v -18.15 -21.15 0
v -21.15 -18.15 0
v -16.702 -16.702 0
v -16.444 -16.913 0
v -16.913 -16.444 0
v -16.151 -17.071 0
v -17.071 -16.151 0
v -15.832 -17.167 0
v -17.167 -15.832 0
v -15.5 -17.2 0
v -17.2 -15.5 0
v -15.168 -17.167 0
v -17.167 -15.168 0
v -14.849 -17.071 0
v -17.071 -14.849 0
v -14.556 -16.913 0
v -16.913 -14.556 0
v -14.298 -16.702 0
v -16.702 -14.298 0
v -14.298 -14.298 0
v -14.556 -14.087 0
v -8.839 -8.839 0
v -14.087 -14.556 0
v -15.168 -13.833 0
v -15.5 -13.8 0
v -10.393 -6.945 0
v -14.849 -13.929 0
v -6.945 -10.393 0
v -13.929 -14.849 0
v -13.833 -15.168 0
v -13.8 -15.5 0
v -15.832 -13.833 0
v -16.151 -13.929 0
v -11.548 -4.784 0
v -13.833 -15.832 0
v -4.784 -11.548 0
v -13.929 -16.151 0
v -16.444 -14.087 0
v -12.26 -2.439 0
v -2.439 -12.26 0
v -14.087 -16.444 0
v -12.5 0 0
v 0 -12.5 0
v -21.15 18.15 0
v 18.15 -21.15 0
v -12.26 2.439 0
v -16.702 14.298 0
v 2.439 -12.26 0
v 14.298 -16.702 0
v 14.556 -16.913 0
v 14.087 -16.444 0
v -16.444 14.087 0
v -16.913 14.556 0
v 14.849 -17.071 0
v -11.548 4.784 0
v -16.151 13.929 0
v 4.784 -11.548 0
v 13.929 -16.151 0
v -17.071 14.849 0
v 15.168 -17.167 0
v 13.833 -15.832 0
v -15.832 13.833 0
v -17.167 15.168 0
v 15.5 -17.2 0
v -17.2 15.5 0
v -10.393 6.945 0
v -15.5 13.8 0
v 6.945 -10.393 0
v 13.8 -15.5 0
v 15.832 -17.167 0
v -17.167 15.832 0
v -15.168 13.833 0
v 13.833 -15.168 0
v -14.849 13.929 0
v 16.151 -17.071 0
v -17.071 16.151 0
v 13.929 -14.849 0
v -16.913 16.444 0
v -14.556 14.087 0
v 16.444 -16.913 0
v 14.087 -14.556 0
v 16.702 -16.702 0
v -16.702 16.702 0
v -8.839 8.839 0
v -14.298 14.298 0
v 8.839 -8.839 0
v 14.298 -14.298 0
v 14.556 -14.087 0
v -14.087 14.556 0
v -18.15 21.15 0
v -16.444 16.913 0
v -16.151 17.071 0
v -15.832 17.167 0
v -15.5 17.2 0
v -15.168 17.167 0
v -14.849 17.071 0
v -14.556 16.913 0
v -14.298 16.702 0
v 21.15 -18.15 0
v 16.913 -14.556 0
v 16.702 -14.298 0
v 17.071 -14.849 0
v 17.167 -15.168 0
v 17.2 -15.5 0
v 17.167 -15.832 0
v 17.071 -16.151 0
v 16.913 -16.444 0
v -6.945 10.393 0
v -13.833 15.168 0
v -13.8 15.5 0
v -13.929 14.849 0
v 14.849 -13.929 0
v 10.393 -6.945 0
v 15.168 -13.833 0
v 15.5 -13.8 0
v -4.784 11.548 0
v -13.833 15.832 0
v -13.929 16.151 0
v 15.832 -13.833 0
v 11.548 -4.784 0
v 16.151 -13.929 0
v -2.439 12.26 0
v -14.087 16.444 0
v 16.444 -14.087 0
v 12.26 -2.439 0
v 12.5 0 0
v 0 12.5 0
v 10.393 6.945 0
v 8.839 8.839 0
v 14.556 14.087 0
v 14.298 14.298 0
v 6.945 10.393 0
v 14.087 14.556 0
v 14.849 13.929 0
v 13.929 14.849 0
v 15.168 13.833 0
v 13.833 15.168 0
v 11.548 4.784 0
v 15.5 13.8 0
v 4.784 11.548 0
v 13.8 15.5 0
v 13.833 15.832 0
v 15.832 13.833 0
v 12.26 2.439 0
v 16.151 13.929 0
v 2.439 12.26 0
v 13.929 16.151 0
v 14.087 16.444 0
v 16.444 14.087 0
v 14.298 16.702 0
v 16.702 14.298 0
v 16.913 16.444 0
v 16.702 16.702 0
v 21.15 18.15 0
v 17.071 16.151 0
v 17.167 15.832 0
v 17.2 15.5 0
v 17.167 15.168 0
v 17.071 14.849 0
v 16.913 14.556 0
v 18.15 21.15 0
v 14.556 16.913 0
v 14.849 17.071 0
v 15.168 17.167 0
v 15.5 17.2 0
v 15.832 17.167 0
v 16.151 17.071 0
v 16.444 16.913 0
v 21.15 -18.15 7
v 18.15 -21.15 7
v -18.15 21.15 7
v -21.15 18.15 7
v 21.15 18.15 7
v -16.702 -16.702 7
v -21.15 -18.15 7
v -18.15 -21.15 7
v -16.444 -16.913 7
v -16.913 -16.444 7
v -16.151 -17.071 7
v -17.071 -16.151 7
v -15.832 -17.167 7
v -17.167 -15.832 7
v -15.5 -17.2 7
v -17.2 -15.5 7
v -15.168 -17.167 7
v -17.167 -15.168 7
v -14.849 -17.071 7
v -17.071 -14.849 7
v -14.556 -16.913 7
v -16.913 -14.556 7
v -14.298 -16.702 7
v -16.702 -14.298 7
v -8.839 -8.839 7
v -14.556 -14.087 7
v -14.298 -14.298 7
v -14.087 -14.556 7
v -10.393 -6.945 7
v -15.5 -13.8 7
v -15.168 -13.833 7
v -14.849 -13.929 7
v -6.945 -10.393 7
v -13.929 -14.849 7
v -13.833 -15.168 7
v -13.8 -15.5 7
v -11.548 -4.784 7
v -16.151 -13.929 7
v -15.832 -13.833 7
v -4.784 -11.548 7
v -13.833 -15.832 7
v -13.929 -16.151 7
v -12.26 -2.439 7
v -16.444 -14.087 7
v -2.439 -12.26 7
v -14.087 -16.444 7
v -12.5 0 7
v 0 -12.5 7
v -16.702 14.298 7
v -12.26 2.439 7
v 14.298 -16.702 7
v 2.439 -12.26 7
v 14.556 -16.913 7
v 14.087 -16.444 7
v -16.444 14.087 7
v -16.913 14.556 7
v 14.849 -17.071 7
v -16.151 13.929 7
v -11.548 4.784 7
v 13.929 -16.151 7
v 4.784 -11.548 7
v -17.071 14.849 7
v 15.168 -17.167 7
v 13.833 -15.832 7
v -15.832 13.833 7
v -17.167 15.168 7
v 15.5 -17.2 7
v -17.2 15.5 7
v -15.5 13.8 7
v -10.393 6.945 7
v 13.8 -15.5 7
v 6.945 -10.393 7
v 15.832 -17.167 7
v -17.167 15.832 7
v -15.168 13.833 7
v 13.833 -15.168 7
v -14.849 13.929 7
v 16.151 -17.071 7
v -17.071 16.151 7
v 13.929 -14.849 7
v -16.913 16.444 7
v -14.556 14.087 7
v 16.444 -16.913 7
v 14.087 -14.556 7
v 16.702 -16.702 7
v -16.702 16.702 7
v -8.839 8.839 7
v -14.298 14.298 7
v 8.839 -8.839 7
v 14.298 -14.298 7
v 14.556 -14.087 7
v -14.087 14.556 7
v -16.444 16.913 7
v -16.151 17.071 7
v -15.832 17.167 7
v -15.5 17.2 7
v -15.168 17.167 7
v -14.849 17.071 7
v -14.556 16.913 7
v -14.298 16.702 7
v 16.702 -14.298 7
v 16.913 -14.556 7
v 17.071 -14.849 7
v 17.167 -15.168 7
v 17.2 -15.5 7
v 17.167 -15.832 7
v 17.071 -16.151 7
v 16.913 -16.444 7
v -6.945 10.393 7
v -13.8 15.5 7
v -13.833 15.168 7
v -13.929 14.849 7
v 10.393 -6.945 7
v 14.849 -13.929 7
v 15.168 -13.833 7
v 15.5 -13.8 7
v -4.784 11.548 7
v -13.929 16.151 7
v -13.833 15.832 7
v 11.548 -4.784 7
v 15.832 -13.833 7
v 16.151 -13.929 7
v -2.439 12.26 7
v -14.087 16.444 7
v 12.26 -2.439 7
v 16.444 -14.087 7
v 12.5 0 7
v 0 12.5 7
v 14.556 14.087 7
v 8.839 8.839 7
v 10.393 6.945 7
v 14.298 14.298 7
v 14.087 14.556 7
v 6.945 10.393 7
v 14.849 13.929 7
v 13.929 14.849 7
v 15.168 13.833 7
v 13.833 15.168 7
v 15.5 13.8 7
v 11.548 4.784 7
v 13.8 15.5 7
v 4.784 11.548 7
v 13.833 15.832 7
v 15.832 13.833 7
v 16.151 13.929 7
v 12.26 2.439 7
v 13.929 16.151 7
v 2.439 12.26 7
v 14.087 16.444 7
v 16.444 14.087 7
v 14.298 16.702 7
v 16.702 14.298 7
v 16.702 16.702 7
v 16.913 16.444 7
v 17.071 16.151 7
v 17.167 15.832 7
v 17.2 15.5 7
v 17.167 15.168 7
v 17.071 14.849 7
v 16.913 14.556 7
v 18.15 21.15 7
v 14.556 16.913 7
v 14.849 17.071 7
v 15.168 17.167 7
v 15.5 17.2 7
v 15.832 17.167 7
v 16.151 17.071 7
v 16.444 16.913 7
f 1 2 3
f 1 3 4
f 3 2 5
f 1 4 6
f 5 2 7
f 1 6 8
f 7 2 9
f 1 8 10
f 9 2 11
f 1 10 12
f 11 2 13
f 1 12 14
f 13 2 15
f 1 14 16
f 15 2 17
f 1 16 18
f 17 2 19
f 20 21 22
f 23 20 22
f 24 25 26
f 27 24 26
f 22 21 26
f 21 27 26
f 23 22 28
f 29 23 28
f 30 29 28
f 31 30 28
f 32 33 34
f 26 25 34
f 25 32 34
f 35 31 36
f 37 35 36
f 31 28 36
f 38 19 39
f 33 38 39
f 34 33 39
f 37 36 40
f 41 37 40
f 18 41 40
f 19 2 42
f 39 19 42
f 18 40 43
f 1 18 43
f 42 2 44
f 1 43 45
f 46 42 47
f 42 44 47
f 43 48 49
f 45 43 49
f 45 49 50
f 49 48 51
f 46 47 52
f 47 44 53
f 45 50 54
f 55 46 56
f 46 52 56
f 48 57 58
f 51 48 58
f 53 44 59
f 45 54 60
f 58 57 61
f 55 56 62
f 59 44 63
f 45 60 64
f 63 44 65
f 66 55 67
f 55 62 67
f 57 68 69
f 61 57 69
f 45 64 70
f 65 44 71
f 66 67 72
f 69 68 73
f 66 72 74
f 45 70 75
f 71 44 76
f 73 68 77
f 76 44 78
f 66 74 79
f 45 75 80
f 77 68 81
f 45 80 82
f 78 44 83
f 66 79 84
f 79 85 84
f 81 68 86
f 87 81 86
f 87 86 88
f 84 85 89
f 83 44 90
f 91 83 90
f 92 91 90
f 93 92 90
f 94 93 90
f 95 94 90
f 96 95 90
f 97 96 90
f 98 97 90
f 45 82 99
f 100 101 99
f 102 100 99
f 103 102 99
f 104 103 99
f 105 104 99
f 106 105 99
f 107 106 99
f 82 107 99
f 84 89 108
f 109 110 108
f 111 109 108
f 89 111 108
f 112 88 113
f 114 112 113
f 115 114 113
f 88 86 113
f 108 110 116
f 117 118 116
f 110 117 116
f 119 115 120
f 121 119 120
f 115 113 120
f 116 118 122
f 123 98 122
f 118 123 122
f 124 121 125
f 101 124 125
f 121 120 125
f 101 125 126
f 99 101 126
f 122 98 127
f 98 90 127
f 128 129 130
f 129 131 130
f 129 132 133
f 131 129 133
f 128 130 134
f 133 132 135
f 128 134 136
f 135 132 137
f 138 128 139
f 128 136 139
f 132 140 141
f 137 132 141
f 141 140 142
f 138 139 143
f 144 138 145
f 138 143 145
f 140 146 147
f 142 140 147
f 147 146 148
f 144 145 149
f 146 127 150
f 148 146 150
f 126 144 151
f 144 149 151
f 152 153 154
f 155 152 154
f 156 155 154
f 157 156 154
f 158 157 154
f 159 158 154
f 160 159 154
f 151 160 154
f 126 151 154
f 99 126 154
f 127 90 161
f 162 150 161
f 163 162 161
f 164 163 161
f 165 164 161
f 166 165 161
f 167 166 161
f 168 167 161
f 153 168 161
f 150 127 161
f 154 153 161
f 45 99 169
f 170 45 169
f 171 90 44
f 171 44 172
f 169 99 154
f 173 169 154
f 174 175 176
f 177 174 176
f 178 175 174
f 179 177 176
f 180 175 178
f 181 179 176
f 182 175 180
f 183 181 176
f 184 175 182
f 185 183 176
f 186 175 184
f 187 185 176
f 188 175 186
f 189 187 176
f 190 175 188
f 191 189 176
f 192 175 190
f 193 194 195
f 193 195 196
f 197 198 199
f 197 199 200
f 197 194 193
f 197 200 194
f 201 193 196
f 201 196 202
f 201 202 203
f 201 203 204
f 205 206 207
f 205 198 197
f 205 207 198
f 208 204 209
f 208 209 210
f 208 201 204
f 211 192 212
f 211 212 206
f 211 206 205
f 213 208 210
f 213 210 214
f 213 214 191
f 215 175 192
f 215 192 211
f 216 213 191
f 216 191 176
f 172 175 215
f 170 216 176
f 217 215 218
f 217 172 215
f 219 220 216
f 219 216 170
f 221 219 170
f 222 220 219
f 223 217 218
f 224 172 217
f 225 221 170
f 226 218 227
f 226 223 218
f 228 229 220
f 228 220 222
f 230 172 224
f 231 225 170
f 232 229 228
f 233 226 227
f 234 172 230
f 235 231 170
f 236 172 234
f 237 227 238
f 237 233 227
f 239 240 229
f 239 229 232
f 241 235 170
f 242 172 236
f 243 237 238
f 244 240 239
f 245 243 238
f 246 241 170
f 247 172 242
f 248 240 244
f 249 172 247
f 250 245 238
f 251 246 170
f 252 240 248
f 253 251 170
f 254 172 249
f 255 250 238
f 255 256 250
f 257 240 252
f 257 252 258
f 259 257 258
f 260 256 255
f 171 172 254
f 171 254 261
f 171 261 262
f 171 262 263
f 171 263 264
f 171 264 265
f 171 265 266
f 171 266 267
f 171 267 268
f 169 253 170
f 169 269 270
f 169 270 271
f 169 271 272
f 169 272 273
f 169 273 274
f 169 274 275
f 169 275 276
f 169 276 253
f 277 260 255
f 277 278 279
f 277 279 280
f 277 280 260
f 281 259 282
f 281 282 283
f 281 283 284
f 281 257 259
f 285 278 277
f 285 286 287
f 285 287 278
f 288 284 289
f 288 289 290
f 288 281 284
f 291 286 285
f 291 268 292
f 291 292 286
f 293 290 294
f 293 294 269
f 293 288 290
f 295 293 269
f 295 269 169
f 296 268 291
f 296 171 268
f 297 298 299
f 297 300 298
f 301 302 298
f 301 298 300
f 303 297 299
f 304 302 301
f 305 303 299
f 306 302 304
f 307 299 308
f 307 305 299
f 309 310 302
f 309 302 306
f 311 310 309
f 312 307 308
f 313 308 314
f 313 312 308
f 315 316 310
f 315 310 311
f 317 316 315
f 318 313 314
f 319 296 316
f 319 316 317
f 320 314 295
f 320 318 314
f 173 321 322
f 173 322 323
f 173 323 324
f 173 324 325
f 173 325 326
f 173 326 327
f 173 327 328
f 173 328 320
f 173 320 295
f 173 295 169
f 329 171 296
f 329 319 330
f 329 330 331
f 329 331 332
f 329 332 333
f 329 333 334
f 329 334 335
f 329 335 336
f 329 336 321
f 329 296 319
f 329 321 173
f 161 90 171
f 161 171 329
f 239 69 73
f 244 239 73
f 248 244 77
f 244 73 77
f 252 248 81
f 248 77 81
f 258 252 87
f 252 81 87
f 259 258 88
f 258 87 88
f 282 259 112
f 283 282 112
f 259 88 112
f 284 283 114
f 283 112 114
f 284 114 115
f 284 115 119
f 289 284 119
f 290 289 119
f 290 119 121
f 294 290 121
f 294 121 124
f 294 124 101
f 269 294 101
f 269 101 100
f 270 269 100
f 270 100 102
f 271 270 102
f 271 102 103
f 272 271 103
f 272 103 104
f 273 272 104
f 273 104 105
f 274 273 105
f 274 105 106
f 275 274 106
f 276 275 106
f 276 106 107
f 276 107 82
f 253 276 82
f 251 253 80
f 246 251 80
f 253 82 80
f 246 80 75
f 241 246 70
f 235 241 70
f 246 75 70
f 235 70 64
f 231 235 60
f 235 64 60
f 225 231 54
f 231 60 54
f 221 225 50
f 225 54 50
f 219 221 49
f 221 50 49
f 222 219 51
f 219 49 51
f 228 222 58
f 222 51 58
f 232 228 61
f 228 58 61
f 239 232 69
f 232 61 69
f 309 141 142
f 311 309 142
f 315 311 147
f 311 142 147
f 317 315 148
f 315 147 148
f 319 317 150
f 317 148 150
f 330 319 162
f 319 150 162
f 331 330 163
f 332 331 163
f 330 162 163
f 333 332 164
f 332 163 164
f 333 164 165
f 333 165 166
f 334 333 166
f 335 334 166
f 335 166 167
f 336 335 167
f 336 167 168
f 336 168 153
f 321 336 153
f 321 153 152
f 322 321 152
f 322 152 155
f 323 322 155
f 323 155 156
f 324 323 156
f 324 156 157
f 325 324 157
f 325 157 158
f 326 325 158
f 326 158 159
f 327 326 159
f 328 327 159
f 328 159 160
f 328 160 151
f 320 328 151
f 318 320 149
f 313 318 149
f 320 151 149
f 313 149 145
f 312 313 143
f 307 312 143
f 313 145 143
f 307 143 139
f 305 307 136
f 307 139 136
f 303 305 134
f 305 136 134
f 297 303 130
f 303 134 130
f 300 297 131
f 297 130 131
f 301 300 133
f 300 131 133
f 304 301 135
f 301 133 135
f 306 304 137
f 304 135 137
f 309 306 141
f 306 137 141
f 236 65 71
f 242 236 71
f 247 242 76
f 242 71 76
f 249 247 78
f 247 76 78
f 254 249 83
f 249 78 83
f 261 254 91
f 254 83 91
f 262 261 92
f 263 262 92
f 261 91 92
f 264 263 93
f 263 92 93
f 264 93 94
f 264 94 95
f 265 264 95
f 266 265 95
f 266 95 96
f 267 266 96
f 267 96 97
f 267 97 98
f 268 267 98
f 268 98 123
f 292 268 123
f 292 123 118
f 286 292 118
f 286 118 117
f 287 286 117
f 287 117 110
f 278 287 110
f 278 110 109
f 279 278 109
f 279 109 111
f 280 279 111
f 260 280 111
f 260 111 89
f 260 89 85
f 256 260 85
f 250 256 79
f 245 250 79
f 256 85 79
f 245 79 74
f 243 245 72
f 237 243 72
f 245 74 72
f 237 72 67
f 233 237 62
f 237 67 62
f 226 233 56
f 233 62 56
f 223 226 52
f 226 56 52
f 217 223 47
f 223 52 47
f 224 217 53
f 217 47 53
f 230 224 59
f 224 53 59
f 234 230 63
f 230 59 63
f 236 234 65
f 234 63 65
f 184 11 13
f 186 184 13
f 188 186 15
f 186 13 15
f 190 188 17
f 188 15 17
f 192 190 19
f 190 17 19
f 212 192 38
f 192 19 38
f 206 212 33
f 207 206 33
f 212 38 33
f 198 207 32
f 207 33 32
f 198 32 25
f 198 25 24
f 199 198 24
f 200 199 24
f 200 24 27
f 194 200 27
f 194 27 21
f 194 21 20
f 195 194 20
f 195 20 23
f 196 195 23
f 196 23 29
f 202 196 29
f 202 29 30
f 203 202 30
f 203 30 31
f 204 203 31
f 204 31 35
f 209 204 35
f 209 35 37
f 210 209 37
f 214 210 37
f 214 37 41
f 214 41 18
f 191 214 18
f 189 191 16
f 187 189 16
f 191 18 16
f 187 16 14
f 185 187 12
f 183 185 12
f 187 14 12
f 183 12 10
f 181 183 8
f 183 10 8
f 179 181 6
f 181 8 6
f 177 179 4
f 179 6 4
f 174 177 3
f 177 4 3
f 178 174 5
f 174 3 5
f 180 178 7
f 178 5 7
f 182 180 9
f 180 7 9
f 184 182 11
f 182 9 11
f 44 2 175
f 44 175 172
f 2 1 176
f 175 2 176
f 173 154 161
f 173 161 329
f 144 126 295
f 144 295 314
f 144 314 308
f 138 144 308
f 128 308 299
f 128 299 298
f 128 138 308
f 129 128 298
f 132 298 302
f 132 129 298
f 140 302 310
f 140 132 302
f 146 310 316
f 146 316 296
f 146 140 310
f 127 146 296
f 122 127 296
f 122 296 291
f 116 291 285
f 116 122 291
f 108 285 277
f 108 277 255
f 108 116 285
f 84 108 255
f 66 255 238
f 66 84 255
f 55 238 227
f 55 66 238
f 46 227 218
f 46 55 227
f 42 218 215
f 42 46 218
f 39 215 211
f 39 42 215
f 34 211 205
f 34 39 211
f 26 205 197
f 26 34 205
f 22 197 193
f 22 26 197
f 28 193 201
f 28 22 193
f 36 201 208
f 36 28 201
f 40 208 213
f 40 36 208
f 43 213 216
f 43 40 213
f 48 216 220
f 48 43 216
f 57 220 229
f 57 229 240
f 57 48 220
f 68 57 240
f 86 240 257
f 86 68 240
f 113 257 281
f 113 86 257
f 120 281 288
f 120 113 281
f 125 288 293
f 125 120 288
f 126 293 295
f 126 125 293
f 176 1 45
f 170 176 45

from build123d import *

# Parameters (mm, degrees)
SKETCH1_W                = 42.3
SKETCH1_H                = 42.3
SKETCH1_R                = 12.5
BOSS_EXTRUDE1_DEPTH      = 7
CHAMFER1_SIZE            = 3
M3_CLEARANCE_HOLE1_D     = 3.4
M3_CLEARANCE_HOLE1_DEPTH = 7.5
M3_CLEARANCE_HOLE1_TIP   = 1.021463052


with BuildPart() as part:
    # Sketch1 → Boss-Extrude1 (new body)
    with BuildSketch(Plane.XY):
        Rectangle(SKETCH1_W, SKETCH1_H)
        Circle(SKETCH1_R, mode=Mode.SUBTRACT)
    extrude(amount=BOSS_EXTRUDE1_DEPTH)

    # Chamfer1
    chamfer1_edges = [part.edges().sort_by_distance(p)[0] for p in [
        (21.15, -21.15, 3.5),
        (-21.15, -21.15, 3.5),
        (-21.15, 21.15, 3.5),
        (21.15, 21.15, 3.5),
    ]]
    chamfer(chamfer1_edges, length=CHAMFER1_SIZE)

    # M3 Clearance Hole1
    with Locations(Plane.XY.offset(7)):
        with Locations((15.5, 15.5), (-15.5, 15.5), (-15.5, -15.5), (15.5, -15.5)):
            Hole(M3_CLEARANCE_HOLE1_D / 2, depth=M3_CLEARANCE_HOLE1_DEPTH)
            with Locations((0, 0, -(M3_CLEARANCE_HOLE1_DEPTH + M3_CLEARANCE_HOLE1_TIP / 2))):  # 118° drill point
                Cone(0, M3_CLEARANCE_HOLE1_D / 2, M3_CLEARANCE_HOLE1_TIP, mode=Mode.SUBTRACT)


solid = part.part
